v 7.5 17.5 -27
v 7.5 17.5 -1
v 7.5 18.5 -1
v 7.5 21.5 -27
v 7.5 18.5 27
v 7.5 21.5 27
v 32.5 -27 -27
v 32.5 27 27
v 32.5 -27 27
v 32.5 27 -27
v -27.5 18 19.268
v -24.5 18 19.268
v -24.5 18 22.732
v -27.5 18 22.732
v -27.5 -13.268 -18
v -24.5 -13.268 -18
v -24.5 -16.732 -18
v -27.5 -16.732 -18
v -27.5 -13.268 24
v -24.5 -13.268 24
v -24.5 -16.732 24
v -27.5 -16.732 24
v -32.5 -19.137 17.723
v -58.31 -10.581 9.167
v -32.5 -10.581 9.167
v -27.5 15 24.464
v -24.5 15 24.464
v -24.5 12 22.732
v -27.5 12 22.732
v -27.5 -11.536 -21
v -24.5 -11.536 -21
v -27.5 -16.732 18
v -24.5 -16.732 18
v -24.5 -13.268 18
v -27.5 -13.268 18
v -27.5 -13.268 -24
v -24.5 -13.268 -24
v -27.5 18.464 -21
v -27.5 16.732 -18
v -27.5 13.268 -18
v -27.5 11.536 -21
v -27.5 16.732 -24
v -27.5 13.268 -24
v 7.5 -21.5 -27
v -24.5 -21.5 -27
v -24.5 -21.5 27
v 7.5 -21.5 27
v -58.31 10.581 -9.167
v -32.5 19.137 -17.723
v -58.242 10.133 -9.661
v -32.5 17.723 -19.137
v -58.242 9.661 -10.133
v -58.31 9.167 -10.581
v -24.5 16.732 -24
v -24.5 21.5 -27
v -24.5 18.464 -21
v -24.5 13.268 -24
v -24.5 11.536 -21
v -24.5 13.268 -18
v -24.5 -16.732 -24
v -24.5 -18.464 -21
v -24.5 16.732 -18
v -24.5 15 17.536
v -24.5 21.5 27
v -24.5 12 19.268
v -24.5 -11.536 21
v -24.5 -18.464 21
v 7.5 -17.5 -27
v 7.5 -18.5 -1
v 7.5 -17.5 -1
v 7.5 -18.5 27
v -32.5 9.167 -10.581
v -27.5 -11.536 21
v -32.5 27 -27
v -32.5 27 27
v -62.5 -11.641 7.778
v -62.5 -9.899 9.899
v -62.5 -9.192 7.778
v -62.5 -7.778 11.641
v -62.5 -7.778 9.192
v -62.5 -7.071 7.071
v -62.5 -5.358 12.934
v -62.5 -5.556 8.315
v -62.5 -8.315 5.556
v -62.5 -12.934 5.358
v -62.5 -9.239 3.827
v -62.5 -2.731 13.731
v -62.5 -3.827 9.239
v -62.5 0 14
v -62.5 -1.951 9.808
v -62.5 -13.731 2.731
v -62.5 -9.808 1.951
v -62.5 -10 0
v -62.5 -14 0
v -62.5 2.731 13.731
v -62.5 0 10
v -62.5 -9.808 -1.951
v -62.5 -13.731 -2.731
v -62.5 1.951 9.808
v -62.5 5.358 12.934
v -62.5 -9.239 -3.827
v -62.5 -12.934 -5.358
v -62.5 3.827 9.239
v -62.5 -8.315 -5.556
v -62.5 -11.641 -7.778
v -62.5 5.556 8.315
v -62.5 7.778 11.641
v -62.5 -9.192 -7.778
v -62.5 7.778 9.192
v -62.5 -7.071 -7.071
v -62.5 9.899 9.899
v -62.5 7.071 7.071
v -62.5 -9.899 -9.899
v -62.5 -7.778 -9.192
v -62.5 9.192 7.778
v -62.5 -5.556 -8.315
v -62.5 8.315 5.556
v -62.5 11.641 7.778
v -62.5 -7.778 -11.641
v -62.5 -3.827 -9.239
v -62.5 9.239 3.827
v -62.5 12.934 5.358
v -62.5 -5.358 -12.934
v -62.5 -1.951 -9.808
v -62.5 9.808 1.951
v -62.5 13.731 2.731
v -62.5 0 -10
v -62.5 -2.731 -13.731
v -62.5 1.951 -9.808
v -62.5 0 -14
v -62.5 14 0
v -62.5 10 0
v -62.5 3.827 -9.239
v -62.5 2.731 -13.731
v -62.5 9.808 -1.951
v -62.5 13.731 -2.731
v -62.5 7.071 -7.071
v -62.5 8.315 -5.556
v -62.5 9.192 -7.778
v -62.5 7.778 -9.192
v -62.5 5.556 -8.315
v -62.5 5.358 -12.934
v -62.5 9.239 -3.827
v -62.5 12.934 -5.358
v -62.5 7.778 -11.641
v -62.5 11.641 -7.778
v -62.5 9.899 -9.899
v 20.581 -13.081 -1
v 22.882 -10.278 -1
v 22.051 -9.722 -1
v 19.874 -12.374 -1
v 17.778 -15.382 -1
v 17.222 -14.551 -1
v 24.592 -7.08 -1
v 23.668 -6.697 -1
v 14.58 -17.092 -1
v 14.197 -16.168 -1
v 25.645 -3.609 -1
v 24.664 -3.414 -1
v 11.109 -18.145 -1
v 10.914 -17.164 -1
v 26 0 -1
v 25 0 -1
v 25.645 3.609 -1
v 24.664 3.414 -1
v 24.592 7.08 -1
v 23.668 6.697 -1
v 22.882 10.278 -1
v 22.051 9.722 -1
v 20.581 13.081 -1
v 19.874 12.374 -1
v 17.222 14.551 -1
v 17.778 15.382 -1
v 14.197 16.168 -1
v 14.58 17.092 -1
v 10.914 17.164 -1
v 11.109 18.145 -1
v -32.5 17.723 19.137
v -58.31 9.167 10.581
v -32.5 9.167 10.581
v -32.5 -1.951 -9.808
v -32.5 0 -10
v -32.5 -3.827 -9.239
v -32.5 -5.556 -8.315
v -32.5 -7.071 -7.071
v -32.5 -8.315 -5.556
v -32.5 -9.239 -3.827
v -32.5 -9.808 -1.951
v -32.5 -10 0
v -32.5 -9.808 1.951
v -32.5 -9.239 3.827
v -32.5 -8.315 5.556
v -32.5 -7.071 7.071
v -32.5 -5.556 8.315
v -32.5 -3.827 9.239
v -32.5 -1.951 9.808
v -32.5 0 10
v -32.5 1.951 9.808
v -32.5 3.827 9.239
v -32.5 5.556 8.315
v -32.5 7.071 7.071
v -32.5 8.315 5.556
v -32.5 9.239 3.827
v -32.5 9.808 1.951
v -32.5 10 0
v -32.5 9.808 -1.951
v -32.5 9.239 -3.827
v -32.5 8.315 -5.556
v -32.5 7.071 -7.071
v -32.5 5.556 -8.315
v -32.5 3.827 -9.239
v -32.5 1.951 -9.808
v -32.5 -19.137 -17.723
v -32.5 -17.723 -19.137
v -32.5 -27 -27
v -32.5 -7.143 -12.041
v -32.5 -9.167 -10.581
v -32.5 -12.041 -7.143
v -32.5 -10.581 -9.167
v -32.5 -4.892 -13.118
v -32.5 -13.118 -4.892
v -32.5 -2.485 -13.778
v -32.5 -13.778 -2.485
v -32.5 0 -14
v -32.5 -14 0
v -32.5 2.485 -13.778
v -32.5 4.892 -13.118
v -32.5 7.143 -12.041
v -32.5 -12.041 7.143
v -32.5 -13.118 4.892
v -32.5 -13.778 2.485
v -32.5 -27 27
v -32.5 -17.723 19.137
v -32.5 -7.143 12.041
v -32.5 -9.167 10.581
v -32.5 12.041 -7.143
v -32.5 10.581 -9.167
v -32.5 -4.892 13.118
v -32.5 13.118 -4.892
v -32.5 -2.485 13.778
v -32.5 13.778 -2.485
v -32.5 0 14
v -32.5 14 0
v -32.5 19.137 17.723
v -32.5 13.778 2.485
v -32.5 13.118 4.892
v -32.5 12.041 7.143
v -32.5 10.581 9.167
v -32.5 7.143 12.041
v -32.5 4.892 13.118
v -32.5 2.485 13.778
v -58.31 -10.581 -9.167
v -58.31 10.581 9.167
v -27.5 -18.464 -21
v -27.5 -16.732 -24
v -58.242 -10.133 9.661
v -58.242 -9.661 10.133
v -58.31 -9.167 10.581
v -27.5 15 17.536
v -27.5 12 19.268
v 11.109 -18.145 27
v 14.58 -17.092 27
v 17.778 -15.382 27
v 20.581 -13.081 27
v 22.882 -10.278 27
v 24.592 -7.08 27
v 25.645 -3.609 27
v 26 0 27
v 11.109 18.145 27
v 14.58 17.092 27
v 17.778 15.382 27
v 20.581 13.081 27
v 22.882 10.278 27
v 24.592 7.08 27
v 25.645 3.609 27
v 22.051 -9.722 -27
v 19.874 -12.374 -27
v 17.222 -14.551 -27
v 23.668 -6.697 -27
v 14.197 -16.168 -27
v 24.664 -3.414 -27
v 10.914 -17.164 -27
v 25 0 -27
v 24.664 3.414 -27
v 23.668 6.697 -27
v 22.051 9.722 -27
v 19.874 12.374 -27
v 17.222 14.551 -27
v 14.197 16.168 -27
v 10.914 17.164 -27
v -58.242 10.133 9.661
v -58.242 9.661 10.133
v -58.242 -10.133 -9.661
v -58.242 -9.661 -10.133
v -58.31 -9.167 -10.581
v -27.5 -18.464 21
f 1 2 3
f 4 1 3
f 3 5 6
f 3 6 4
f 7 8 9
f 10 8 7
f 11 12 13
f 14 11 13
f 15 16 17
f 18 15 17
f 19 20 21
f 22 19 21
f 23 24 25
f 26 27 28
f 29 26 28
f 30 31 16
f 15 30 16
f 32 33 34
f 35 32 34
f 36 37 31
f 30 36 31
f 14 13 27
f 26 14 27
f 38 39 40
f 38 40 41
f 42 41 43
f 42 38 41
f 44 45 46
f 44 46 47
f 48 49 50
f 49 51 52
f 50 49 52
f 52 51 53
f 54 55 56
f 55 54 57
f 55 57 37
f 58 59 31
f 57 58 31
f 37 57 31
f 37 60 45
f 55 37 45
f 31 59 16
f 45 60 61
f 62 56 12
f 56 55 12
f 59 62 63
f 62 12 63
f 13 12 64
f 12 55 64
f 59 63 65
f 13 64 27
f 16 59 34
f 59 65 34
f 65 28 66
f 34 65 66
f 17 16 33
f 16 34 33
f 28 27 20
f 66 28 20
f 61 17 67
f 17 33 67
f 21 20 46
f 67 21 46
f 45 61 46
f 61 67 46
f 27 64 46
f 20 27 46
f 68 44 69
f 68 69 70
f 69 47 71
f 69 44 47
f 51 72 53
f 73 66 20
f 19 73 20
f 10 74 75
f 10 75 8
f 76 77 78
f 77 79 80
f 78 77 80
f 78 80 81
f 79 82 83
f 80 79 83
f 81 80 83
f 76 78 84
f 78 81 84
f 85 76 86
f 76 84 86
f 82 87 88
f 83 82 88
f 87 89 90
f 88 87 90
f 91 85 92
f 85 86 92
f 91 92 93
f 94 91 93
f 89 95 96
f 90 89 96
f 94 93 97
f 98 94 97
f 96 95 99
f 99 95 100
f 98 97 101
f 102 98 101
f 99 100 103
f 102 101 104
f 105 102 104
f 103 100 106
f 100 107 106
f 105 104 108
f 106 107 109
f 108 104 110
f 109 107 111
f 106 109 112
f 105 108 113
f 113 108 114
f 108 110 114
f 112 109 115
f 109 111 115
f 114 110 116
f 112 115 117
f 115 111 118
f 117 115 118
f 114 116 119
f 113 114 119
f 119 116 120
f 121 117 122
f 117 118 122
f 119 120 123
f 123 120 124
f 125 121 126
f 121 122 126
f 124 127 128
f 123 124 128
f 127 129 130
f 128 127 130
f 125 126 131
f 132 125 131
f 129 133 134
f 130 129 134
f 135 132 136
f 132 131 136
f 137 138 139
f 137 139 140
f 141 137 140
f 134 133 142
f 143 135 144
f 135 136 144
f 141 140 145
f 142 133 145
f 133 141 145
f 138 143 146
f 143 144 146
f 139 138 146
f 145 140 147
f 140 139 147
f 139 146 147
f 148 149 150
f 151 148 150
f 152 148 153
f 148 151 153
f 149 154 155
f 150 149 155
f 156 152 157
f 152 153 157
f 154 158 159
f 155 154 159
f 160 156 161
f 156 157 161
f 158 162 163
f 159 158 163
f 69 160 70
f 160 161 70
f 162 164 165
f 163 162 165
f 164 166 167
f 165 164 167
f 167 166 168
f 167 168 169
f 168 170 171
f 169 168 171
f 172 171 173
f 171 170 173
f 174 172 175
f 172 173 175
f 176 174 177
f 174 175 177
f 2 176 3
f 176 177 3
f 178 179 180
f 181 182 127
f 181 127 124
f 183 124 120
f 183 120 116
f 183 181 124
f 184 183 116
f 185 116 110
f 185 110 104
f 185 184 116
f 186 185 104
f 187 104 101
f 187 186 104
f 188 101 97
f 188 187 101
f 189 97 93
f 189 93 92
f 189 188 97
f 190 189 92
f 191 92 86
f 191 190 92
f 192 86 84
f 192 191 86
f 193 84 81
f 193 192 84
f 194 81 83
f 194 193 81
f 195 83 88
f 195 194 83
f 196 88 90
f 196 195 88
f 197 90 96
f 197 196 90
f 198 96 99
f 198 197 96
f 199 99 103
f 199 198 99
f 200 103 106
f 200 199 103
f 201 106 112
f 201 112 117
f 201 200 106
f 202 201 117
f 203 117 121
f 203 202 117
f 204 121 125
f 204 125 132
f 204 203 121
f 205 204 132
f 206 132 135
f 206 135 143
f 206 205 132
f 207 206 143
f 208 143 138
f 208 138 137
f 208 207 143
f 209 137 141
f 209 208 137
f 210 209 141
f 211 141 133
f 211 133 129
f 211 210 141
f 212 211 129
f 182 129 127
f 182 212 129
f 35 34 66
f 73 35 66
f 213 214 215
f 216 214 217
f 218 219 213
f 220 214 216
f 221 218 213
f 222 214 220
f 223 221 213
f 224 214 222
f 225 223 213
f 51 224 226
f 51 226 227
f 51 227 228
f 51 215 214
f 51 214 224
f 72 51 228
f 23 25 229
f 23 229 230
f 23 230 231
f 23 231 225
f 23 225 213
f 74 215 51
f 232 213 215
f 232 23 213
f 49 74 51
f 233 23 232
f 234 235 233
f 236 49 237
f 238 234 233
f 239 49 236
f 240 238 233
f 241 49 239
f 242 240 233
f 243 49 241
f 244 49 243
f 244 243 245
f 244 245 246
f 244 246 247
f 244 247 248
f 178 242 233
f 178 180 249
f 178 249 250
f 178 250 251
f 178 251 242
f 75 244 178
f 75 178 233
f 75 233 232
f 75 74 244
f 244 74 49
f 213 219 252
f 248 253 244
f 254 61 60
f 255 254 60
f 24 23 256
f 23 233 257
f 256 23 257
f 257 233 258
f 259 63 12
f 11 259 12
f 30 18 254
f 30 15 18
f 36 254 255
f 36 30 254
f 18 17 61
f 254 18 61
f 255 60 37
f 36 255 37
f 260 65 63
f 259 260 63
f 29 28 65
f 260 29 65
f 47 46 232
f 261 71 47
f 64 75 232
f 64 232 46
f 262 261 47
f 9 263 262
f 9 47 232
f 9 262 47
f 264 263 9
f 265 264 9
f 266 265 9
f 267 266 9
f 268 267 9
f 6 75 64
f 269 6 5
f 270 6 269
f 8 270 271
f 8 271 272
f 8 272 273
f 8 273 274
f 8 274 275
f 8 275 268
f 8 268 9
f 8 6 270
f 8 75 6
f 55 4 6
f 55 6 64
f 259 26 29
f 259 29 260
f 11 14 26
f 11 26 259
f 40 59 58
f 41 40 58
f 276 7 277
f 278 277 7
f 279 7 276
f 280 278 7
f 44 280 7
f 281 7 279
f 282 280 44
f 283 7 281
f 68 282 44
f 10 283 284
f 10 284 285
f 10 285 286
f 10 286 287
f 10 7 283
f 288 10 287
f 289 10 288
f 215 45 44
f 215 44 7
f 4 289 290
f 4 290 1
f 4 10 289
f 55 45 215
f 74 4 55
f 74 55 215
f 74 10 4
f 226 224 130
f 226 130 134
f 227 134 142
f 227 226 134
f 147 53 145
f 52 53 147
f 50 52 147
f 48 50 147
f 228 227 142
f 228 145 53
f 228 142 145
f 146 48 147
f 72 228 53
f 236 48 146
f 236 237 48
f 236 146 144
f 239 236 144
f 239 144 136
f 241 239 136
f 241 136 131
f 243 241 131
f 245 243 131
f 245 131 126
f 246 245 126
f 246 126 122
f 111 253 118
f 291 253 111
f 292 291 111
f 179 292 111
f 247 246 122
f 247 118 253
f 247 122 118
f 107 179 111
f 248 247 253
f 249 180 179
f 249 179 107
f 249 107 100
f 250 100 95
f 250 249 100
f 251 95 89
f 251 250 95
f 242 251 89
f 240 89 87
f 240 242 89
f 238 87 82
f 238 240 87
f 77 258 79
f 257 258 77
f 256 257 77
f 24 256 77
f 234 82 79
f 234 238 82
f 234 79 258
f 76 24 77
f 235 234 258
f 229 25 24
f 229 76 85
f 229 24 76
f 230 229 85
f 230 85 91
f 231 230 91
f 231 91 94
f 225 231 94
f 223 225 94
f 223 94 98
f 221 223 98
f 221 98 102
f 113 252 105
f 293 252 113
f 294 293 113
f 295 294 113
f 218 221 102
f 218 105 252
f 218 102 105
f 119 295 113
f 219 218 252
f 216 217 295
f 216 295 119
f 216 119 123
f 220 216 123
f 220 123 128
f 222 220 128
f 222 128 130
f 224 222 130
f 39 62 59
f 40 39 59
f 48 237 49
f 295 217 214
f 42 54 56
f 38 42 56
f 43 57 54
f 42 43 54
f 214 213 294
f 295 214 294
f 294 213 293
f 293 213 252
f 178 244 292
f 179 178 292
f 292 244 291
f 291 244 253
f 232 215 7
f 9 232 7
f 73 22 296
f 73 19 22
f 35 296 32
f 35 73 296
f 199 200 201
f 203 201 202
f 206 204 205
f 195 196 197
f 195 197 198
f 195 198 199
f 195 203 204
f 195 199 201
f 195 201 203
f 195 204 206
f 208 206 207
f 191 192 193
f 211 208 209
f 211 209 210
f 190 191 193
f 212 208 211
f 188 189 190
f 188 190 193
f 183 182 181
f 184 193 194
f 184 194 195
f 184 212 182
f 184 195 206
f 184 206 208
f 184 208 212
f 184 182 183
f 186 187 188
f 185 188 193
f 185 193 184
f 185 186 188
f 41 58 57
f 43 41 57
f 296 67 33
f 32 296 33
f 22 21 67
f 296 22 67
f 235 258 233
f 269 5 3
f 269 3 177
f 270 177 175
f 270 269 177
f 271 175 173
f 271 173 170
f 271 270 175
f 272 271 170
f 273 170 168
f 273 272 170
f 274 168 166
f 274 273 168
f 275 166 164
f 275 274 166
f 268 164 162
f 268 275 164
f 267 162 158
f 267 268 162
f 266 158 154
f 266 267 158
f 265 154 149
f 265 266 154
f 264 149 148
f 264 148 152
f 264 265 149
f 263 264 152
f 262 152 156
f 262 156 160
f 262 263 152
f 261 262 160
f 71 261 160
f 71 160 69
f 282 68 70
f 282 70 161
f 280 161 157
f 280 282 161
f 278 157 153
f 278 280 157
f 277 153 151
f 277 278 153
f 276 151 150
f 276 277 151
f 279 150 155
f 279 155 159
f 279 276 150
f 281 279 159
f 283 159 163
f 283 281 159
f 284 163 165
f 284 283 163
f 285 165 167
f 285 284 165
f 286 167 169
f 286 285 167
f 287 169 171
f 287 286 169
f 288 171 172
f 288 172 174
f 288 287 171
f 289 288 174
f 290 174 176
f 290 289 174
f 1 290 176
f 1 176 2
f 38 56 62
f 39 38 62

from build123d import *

# Parameters (mm, degrees)
BOSS_EXTRUDE1_DEPTH = 27
SKETCH10_R          = 14
BOSS_EXTRUDE5_DEPTH = 30
SKETCH2_R           = 10
CUT_EXTRUDE7_DEPTH  = 30
BOSS_EXTRUDE9_DEPTH = 1
CIRPATTERN1_COUNT   = 2
CIRPATTERN1_ANGLE   = 90
CUT_EXTRUDE8_DEPTH  = 28
CUT_EXTRUDE9_DEPTH  = 26
CUT_EXTRUDE10_DEPTH = 87.897928629
CUT_EXTRUDE11_DEPTH = 3


with BuildPart() as part:
    # Sketch1 → Boss-Extrude1 (new, symmetric)
    with BuildSketch(Plane(origin=(0, 0, 0), x_dir=(1, 0, 0), z_dir=(0, 1, 0))):
        Polygon((32.5, -27), (32.5, 27), (-32.5, 27), (-32.5, -27), (-20, -27), align=None)
    extrude(amount=BOSS_EXTRUDE1_DEPTH, both=True)

    # Sketch10 → Boss-Extrude5 (add)
    with BuildSketch(Plane(origin=(-32.5, 0, 0), x_dir=(0, 0, -1), z_dir=(1, 0, 0))):
        Circle(SKETCH10_R)
    extrude(amount=-BOSS_EXTRUDE5_DEPTH)

    # Sketch2 → Cut-Extrude7 (cut)
    with BuildSketch(Plane.ZY.offset(32.5)):
        with Locations(Location((0, 0, 0), (0, 0, 180))):
            Circle(SKETCH2_R)
    extrude(amount=CUT_EXTRUDE7_DEPTH, mode=Mode.SUBTRACT)

    # Sketch16 → Boss-Extrude9 (add, symmetric)
    with BuildSketch(Plane(origin=(0, 0, 0), x_dir=(-1, 0, 0), z_dir=(0, 0.7071067811865475, -0.7071067811865477))):
        Polygon((62.5, -12), (30, -12), (32.5, -26.063797676), align=None)
        Polygon((30, 12), (32.5, 26.063797676), (62.5, 12), align=None)
    boss_extrude9 = extrude(amount=BOSS_EXTRUDE9_DEPTH, both=True)

    # CirPattern1: Boss-Extrude9 ×2 about axis
    cirpattern1_axis = Axis((0, 0, 0), (1, 0, 0))
    for i in range(1, CIRPATTERN1_COUNT):
        add(boss_extrude9.rotate(cirpattern1_axis, i * CIRPATTERN1_ANGLE / (CIRPATTERN1_COUNT - 1)))

    # Sketch18 → Cut-Extrude8 (cut)
    with BuildSketch(Plane.XY.offset(27)):
        with BuildLine():
            Line((7.5, -18.5), (-2.5, -18.5))
            ThreePointArc((-2.5, -18.5), (-21, 0), (-2.5, 18.5))
            Line((-2.5, 18.5), (7.5, 18.5))
            ThreePointArc((7.5, 18.5), (26, 0), (7.5, -18.5))
        make_face()
    extrude(amount=-CUT_EXTRUDE8_DEPTH, mode=Mode.SUBTRACT)

    # Sketch19 → Cut-Extrude9 (cut)
    with BuildSketch(Plane(origin=(0, 0, -27), x_dir=(-1, 0, 0), z_dir=(0, 0, -1))):
        with BuildLine():
            Line((2.5, -17.5), (-7.5, -17.5))
            ThreePointArc((-7.5, -17.5), (-25, 0), (-7.5, 17.5))
            Line((-7.5, 17.5), (2.5, 17.5))
            ThreePointArc((2.5, 17.5), (20, 0), (2.5, -17.5))
        make_face()
    extrude(amount=-CUT_EXTRUDE9_DEPTH, mode=Mode.SUBTRACT)

    # Sketch20 → Cut-Extrude10 (cut, through all)
    with BuildSketch(Plane.XY.offset(27)):
        Polygon((-24.5, 21.5), (-24.5, -21.5), (7.5, -21.5), (7.5, -18.5), (7.5, 18.5), (7.5, 21.5), align=None)
    extrude(amount=-CUT_EXTRUDE10_DEPTH, mode=Mode.SUBTRACT)

    # Sketch22 → Cut-Extrude11 (cut)
    with BuildSketch(Plane(origin=(-24.5, 0, 0), x_dir=(0, 0, -1), z_dir=(1, 0, 0))):
        Polygon((18, -16.732050808), (21, -18.464101615), (24, -16.732050808), (24, -13.267949192), (21, -11.535898385), (18, -13.267949192), align=None)
        Polygon((-24, -16.732050808), (-21, -18.464101615), (-18, -16.732050808), (-18, -13.267949192), (-21, -11.535898385), (-24, -13.267949192), align=None)
        Polygon((-24.464101615, 15), (-22.732050808, 12), (-19.267949192, 12), (-17.535898385, 15), (-19.267949192, 18), (-22.732050808, 18), align=None)
        Polygon((18, 16.732050808), (18, 13.267949192), (21, 11.535898385), (24, 13.267949192), (24, 16.732050808), (21, 18.464101615), align=None)
    extrude(amount=-CUT_EXTRUDE11_DEPTH, mode=Mode.SUBTRACT)


solid = part.part
